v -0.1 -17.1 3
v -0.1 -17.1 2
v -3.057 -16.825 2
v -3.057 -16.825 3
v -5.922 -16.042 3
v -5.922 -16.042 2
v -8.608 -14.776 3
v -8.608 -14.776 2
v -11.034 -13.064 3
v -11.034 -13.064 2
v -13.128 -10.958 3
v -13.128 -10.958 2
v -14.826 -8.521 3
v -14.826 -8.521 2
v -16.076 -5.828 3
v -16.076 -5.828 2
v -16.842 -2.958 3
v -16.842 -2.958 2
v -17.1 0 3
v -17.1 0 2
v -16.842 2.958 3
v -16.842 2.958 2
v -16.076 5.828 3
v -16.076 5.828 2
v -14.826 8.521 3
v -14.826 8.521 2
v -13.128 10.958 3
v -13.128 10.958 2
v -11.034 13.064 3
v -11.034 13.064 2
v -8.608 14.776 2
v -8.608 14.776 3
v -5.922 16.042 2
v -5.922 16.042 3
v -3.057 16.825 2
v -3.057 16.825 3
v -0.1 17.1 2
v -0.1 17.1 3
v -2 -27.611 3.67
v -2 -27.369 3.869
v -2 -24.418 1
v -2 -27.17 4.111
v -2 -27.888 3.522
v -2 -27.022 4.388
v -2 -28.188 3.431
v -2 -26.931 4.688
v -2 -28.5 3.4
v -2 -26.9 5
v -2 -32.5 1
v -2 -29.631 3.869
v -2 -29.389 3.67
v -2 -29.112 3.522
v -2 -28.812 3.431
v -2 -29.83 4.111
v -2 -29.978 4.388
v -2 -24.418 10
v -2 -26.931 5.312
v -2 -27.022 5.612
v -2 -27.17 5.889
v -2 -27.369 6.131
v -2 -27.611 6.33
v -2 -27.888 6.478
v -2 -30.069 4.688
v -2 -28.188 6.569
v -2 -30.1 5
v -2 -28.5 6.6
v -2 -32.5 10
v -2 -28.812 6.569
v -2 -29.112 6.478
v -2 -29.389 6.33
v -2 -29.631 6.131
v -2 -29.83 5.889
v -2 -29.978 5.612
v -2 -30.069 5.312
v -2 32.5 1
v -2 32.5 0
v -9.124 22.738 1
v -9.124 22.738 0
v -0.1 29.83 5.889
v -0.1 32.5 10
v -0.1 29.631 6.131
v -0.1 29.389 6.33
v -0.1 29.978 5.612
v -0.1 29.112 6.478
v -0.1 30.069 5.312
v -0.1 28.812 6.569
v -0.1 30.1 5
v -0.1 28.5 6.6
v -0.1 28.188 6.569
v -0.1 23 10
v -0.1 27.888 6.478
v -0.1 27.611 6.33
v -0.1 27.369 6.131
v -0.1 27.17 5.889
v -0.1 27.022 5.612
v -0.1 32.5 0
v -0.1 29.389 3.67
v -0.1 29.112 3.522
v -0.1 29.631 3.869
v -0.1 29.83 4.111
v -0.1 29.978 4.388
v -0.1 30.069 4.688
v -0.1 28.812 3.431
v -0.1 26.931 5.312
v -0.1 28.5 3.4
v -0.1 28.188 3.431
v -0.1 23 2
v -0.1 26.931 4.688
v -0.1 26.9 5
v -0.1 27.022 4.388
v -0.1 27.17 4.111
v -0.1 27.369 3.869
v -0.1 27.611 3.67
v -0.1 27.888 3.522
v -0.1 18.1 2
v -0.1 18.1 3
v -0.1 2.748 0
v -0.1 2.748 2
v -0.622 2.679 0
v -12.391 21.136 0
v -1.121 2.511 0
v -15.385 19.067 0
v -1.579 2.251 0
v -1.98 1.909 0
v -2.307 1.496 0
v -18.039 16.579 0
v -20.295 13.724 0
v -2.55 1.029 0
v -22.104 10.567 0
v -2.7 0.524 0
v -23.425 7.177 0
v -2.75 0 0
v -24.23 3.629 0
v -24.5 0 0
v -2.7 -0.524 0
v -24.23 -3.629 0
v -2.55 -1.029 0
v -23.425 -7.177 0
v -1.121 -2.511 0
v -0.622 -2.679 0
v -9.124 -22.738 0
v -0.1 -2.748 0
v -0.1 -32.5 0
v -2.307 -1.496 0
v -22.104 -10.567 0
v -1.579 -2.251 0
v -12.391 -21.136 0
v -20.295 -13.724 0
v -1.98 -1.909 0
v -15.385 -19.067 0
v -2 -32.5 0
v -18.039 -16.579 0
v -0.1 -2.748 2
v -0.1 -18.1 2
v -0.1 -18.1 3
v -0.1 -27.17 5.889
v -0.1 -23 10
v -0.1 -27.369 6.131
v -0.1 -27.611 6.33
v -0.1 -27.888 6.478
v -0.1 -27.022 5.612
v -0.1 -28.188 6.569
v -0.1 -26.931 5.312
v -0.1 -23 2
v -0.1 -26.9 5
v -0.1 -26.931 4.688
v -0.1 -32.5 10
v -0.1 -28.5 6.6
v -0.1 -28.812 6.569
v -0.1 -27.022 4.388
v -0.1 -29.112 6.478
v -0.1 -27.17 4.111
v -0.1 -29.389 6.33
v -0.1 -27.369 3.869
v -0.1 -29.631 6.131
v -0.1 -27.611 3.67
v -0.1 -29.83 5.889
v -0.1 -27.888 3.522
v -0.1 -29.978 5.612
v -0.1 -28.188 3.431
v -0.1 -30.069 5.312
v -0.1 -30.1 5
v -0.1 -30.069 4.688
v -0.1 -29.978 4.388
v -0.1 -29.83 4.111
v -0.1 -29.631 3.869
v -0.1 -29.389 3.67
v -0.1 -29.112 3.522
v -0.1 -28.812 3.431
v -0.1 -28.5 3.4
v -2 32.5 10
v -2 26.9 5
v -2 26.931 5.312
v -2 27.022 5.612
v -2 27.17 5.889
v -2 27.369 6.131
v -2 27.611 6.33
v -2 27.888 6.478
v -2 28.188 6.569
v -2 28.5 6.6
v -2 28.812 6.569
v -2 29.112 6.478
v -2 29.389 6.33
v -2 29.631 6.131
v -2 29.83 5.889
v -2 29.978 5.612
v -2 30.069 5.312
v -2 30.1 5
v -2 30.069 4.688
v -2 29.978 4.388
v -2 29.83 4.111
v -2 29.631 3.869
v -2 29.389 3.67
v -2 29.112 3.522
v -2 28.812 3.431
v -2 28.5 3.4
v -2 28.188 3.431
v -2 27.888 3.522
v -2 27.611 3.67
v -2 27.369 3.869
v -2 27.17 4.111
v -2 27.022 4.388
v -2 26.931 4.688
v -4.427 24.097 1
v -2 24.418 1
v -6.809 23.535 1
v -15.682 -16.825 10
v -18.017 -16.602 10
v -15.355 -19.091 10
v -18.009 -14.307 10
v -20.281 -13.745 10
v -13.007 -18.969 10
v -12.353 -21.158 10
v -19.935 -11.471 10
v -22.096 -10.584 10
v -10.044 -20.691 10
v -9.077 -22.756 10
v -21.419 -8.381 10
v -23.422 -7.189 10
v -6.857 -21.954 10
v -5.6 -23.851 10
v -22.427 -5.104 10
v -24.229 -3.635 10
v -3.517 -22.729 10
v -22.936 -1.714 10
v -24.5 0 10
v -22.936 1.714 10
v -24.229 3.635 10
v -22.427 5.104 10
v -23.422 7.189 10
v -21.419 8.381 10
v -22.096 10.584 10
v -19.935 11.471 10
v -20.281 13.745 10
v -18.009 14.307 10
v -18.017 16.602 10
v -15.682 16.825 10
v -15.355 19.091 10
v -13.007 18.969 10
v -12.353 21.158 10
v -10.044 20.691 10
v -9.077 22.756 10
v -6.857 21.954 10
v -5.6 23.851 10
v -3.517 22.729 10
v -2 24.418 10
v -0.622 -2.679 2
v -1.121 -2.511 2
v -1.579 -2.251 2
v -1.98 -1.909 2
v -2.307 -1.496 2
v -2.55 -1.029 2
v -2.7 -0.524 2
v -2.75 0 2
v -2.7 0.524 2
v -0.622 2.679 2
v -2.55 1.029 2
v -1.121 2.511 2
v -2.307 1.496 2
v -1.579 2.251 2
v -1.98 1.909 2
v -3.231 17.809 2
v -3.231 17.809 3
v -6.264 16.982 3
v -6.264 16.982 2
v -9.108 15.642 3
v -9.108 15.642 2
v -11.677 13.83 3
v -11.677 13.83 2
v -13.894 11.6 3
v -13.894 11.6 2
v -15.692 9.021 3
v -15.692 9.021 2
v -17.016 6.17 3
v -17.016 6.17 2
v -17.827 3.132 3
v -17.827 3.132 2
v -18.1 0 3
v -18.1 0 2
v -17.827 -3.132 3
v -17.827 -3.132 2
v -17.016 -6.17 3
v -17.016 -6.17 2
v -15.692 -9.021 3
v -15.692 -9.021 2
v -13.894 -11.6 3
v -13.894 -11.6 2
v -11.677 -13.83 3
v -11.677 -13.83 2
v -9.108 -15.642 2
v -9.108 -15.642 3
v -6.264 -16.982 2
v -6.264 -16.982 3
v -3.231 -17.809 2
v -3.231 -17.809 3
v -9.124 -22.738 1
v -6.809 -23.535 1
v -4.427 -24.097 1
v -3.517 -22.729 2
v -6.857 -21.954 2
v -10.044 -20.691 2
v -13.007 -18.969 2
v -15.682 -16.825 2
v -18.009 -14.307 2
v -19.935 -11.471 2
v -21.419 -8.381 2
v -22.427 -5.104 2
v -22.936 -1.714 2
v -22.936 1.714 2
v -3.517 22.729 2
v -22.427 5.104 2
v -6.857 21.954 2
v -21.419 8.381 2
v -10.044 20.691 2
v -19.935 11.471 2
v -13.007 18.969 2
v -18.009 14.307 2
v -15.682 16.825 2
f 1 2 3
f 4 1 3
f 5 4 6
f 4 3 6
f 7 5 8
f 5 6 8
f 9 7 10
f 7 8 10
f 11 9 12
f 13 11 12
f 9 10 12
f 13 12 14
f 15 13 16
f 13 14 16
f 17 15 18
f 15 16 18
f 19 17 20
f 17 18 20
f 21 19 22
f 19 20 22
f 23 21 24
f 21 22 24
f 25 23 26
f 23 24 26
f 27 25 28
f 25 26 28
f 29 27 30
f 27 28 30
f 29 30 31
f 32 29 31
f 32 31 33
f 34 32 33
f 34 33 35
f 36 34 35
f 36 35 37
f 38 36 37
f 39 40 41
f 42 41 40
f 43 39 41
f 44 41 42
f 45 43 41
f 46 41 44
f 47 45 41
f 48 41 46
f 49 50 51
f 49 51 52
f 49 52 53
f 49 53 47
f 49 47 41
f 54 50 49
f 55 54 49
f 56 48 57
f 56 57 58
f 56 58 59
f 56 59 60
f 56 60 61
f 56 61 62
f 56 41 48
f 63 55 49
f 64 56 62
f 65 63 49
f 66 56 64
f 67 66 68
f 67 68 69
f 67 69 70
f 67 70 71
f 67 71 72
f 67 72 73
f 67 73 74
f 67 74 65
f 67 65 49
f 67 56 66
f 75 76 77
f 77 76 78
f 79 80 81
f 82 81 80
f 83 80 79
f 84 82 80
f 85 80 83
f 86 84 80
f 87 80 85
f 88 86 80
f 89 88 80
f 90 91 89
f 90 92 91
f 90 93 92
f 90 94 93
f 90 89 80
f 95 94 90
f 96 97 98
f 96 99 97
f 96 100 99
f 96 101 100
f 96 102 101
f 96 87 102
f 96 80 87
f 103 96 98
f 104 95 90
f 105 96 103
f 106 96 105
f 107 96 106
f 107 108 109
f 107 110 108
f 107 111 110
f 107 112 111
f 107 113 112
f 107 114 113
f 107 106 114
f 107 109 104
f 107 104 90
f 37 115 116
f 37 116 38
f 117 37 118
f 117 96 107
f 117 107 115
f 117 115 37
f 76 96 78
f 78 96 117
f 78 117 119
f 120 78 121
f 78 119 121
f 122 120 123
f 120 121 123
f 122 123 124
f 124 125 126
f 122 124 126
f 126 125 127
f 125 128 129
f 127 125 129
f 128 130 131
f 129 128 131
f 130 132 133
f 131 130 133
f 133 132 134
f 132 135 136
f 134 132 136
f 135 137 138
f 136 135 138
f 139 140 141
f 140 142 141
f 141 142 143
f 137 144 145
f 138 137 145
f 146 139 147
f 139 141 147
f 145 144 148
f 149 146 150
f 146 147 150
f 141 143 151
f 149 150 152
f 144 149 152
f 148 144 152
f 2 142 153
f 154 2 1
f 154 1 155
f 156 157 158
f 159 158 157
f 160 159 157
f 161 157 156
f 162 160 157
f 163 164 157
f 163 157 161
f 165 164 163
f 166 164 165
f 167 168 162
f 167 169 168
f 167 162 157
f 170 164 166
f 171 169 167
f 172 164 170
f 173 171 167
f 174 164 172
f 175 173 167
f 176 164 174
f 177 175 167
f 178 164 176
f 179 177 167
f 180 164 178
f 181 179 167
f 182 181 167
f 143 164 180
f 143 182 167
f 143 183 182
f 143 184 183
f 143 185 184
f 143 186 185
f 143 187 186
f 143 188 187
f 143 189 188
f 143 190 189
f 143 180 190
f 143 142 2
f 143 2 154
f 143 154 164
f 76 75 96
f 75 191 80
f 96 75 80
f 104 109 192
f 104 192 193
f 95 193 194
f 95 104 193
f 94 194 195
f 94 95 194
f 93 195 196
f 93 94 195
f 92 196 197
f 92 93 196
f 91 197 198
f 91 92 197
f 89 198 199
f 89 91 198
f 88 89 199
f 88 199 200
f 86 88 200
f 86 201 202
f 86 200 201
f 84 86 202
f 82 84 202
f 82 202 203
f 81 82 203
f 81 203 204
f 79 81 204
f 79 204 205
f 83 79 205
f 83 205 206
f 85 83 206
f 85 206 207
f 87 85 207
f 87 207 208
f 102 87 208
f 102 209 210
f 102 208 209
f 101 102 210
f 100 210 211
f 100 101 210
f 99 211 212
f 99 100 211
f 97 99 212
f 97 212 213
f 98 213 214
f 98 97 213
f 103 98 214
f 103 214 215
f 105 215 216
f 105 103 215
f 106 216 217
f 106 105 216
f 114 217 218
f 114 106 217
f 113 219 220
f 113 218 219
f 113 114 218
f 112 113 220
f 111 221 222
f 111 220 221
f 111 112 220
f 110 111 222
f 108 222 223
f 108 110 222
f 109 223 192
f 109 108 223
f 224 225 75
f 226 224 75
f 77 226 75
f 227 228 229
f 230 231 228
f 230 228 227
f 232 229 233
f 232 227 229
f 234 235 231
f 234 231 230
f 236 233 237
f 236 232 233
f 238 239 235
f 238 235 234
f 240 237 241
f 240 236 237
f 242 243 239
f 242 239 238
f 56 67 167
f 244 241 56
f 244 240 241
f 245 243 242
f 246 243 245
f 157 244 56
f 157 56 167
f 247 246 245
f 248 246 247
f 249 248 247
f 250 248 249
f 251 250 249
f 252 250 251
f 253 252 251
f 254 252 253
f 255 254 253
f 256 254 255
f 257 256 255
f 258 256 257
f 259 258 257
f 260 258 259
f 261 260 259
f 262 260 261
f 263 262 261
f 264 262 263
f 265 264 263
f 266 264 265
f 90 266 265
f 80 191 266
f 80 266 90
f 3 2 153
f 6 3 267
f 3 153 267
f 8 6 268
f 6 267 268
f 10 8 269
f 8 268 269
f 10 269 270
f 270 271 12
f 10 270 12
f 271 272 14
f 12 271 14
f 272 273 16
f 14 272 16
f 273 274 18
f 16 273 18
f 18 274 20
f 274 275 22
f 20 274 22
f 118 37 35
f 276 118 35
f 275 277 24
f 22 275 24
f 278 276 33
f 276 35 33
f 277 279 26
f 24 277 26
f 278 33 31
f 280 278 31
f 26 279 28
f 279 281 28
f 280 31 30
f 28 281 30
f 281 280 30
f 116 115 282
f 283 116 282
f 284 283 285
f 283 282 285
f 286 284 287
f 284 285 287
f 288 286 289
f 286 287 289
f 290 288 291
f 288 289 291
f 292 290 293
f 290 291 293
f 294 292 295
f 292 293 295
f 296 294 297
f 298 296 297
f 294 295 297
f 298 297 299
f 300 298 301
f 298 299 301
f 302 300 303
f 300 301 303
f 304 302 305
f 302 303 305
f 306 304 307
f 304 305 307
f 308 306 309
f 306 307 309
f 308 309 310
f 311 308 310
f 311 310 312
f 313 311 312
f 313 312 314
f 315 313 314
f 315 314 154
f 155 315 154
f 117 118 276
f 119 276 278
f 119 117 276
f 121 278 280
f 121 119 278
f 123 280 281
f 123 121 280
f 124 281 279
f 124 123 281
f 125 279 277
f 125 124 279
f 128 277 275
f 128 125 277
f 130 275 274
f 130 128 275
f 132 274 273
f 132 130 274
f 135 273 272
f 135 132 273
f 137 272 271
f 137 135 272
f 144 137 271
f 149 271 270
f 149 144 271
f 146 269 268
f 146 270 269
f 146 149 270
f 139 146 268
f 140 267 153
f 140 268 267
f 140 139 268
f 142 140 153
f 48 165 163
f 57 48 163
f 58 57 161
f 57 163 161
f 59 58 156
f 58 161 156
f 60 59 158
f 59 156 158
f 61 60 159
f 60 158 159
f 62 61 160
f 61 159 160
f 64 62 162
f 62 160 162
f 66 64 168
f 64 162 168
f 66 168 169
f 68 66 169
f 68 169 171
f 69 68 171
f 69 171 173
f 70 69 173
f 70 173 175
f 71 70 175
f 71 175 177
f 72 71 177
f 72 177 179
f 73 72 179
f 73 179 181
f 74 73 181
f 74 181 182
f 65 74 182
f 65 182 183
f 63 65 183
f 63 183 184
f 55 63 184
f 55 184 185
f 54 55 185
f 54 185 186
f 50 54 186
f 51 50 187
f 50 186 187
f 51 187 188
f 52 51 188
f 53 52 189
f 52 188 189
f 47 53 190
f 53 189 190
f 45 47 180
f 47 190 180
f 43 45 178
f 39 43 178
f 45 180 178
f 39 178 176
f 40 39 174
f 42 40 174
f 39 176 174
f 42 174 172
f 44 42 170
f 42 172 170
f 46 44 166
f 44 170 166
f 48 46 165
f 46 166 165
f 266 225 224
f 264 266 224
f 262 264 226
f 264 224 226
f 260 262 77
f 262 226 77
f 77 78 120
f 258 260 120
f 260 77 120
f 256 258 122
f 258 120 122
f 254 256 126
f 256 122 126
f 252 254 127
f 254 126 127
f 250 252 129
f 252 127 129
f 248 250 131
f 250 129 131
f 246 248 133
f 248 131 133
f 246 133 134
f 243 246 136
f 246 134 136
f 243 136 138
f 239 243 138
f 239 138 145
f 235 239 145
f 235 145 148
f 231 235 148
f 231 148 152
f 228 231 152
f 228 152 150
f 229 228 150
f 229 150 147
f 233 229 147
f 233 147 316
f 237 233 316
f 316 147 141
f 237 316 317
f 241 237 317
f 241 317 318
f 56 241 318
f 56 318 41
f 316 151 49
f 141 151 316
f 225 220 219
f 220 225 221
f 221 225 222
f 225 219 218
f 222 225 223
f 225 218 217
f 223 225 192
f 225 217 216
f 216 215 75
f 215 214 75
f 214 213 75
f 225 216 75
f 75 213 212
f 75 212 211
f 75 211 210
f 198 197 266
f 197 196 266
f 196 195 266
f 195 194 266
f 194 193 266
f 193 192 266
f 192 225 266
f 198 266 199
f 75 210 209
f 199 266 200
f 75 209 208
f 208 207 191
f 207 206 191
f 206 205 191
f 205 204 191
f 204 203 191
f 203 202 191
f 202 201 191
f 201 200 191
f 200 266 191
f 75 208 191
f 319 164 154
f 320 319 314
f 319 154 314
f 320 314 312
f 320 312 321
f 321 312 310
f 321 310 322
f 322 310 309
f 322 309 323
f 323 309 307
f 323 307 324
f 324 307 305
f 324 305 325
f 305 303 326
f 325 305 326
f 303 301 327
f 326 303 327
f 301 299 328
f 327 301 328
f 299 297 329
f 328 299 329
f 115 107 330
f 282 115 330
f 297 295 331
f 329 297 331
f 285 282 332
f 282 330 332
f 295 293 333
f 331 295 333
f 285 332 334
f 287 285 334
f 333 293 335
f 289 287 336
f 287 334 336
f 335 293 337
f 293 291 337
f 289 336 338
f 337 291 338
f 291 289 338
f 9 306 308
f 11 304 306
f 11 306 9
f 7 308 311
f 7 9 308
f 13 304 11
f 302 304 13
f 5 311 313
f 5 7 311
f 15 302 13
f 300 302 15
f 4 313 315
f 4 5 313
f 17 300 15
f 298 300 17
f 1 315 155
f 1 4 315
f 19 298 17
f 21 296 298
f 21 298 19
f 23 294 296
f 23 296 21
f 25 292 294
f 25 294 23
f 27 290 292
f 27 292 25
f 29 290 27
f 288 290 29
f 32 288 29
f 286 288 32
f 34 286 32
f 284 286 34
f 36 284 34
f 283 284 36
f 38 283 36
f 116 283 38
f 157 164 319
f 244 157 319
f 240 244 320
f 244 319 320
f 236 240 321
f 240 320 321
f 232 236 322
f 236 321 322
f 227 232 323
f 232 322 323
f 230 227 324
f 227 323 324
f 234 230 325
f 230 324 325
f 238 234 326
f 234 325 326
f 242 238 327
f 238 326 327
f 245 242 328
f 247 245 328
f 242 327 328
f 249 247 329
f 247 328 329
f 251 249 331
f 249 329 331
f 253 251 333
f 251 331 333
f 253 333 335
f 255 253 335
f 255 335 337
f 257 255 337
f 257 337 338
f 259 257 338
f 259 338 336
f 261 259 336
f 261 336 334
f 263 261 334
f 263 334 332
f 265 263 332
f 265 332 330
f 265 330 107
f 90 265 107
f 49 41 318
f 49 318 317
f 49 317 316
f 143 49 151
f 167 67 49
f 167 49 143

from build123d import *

# Parameters (mm, degrees)
BOSS_EXTRUDE1_DEPTH = 2
BOSS_EXTRUDE2_DEPTH = 10
BOSS_EXTRUDE3_DEPTH = 10
SKETCH3_R           = 1.6
CUT_EXTRUDE1_DEPTH  = 10
BOSS_EXTRUDE4_DEPTH = 1
MOVE_FACE1_DEPTH    = 10
BOSS_EXTRUDE5_DEPTH = 1


# Read off the part's stored shape, not the designer's step: Move Face1
with BuildPart() as part:
    # Sketch1 → Boss-Extrude1 (new body)
    with BuildSketch(Plane.XY):
        with BuildLine():
            Line((0, 23), (0, 2.65))
            ThreePointArc((0, 2.65), (-2.65, 0), (0, -2.65))
            Line((0, -2.65), (0, -23))
            ThreePointArc((0, -23), (-23, 0), (0, 23))
        make_face()
    extrude(amount=BOSS_EXTRUDE1_DEPTH)

    # Sketch2 → Boss-Extrude2 (add)
    with BuildSketch(Plane.XY):
        with BuildLine():
            Line((0, 23), (0, 24.5))
            ThreePointArc((0, 24.5), (-24.5, 0), (0, -24.5))
            Line((0, -24.5), (0, -23))
            ThreePointArc((0, -23), (-23, 0), (0, 23))
        make_face()
    extrude(amount=BOSS_EXTRUDE2_DEPTH)

    # Sketch4 → Boss-Extrude3 (add)
    with BuildSketch(Plane.XY.offset(10)):
        Polygon((0, -24.5), (-0.271688165, -23.208442848), (-2, -23.208442848), (-2, -32.5), (0, -32.5), align=None)
    boss_extrude3 = extrude(amount=-BOSS_EXTRUDE3_DEPTH)

    # Sketch3 → Cut-Extrude1 (cut)
    with BuildSketch(Plane(origin=(0, 0, 0), x_dir=(0, 0, -1), z_dir=(1, 0, 0))):
        with Locations(Location((-5, -28.5, 0), (0, 0, 90))):
            Circle(SKETCH3_R)
    cut_extrude1 = extrude(amount=-CUT_EXTRUDE1_DEPTH, mode=Mode.SUBTRACT)

    # Sketch5 → Boss-Extrude4 (add)
    with BuildSketch(Plane(origin=(0, 0, 0), x_dir=(-1, 0, 0), z_dir=(0, 0, -1))):
        Polygon((2, -32.5), (9.124047282, -22.73767273), (2, -22.73767273), align=None)
    boss_extrude4 = extrude(amount=-BOSS_EXTRUDE4_DEPTH)

    # Mirror1: Boss-Extrude3, Cut-Extrude1, Boss-Extrude4 across plane
    add(boss_extrude3.mirror(Plane.ZX))
    add(cut_extrude1.mirror(Plane.ZX), mode=Mode.SUBTRACT)
    add(boss_extrude4.mirror(Plane.ZX))

    # Move Face1 outline → Move Face1 (cut)
    with BuildSketch(Plane.XY):
        with BuildLine():
            ThreePointArc((-0.1, 2.748181217), (-2.75, 0), (-0.1, -2.748181217))
            Line((-0.1, -2.748181217), (-0.1, -32.5))
            Line((-0.1, -32.5), (0, -32.5))
            Line((0, -32.5), (0, -2.65))
            ThreePointArc((0, -2.65), (-2.65, 0), (0, 2.65))
            Line((0, 2.65), (0, 32.5))
            Line((0, 32.5), (-0.1, 32.5))
            Line((-0.1, 32.5), (-0.1, 2.748181217))
        make_face()
    extrude(amount=MOVE_FACE1_DEPTH, mode=Mode.SUBTRACT)

    # Sketch6 → Boss-Extrude5 (add)
    with BuildSketch(Plane.XY.offset(2)):
        with BuildLine():
            Line((-0.1, 17.0997076), (-0.1, 18.099723755))
            ThreePointArc((-0.1, 18.099723755), (-18.1, 0), (-0.1, -18.099723755))
            Line((-0.1, -18.099723755), (-0.1, -17.0997076))
            ThreePointArc((-0.1, -17.0997076), (-17.1, 0), (-0.1, 17.0997076))
        make_face()
    extrude(amount=BOSS_EXTRUDE5_DEPTH)


solid = part.part
